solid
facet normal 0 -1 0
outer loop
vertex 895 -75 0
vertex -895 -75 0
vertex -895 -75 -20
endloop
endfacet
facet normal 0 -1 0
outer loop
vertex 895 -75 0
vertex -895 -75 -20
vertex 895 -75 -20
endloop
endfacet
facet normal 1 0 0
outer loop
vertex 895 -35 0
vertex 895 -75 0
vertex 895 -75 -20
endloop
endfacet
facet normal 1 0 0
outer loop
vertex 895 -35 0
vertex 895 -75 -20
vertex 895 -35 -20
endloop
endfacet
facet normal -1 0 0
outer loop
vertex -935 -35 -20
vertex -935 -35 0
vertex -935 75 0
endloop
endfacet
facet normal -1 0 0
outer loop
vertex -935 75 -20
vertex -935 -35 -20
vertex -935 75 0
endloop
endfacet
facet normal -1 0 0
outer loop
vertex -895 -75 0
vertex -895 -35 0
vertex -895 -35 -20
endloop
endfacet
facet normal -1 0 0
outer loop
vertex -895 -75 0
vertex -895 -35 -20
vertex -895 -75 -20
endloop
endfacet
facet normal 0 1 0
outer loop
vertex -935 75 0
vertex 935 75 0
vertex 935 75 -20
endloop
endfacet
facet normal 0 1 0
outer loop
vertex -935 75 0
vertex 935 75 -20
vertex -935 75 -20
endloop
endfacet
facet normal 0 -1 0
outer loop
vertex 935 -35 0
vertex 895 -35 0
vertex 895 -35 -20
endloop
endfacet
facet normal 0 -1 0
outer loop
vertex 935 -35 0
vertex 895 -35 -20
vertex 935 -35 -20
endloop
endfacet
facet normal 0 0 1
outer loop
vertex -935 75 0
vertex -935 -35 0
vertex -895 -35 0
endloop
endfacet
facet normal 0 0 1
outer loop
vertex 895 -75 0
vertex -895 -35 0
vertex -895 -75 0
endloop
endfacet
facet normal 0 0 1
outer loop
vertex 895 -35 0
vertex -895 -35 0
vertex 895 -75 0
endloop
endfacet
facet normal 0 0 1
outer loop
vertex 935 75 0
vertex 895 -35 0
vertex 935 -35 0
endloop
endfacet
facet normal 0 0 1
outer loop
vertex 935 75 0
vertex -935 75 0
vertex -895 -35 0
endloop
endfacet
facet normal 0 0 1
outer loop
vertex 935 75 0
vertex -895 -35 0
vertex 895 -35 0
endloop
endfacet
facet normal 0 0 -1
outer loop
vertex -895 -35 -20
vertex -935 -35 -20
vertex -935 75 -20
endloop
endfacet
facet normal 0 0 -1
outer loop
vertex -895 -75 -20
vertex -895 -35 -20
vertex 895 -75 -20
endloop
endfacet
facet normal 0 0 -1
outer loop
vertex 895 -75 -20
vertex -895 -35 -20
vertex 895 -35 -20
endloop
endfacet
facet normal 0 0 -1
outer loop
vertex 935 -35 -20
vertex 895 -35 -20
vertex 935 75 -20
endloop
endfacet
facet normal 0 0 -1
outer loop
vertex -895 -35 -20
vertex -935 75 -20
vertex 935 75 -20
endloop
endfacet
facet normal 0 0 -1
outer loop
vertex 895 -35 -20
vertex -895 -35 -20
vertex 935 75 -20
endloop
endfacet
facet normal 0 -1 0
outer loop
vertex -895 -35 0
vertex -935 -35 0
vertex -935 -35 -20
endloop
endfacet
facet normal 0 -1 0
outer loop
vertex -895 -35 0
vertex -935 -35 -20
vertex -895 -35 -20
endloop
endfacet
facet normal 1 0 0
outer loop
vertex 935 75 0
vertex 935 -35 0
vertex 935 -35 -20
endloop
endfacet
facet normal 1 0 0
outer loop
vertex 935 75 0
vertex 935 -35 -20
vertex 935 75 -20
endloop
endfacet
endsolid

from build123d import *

# Parameters (mm, degrees)
F1_W     = 20
F1_H     = 110
F2_DEPTH = 20


with BuildPart() as f2:
    # F1 (on Top) → F2 (new body)
    with BuildSketch(Plane.XY):
        with Locations((-925, 20)):
            Rectangle(F1_W, F1_H)
        with Locations((925, 20)):
            Rectangle(F1_W, F1_H)
        Polygon((-895, -75), (895, -75), (895, -35), (915, -35), (915, 75), (-915, 75), (-915, -35), (-895, -35), align=None)
    extrude(amount=-F2_DEPTH)


solid = f2.part
